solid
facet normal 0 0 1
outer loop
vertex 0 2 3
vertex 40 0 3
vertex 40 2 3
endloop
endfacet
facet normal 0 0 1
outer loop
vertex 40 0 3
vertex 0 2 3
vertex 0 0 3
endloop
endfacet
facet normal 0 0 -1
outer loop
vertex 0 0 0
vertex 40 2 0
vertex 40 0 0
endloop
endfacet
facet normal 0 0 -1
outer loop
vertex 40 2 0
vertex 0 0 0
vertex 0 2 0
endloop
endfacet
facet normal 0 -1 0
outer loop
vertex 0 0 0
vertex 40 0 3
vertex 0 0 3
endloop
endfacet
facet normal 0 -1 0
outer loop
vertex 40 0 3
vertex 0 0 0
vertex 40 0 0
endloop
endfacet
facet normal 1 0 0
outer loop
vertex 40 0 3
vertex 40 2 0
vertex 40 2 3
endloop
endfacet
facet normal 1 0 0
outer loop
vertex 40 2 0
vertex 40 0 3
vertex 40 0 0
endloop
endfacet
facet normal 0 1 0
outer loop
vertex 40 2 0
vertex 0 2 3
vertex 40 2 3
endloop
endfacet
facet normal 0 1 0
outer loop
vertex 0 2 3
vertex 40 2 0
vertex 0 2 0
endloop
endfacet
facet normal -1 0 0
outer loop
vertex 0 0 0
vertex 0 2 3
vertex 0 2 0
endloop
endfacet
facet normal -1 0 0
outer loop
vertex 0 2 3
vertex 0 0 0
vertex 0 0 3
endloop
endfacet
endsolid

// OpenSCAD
/* [Dimensions] */
// Width in millimeters
width=40; // [10:5:100]
/* [Appearance] */
// Select shape
shape="round"; // ["round":"Round", "square":"Square"]
/* [Hidden] */
internalOffset=0.01;
module model() { cube([width,2,3]); }
model();
